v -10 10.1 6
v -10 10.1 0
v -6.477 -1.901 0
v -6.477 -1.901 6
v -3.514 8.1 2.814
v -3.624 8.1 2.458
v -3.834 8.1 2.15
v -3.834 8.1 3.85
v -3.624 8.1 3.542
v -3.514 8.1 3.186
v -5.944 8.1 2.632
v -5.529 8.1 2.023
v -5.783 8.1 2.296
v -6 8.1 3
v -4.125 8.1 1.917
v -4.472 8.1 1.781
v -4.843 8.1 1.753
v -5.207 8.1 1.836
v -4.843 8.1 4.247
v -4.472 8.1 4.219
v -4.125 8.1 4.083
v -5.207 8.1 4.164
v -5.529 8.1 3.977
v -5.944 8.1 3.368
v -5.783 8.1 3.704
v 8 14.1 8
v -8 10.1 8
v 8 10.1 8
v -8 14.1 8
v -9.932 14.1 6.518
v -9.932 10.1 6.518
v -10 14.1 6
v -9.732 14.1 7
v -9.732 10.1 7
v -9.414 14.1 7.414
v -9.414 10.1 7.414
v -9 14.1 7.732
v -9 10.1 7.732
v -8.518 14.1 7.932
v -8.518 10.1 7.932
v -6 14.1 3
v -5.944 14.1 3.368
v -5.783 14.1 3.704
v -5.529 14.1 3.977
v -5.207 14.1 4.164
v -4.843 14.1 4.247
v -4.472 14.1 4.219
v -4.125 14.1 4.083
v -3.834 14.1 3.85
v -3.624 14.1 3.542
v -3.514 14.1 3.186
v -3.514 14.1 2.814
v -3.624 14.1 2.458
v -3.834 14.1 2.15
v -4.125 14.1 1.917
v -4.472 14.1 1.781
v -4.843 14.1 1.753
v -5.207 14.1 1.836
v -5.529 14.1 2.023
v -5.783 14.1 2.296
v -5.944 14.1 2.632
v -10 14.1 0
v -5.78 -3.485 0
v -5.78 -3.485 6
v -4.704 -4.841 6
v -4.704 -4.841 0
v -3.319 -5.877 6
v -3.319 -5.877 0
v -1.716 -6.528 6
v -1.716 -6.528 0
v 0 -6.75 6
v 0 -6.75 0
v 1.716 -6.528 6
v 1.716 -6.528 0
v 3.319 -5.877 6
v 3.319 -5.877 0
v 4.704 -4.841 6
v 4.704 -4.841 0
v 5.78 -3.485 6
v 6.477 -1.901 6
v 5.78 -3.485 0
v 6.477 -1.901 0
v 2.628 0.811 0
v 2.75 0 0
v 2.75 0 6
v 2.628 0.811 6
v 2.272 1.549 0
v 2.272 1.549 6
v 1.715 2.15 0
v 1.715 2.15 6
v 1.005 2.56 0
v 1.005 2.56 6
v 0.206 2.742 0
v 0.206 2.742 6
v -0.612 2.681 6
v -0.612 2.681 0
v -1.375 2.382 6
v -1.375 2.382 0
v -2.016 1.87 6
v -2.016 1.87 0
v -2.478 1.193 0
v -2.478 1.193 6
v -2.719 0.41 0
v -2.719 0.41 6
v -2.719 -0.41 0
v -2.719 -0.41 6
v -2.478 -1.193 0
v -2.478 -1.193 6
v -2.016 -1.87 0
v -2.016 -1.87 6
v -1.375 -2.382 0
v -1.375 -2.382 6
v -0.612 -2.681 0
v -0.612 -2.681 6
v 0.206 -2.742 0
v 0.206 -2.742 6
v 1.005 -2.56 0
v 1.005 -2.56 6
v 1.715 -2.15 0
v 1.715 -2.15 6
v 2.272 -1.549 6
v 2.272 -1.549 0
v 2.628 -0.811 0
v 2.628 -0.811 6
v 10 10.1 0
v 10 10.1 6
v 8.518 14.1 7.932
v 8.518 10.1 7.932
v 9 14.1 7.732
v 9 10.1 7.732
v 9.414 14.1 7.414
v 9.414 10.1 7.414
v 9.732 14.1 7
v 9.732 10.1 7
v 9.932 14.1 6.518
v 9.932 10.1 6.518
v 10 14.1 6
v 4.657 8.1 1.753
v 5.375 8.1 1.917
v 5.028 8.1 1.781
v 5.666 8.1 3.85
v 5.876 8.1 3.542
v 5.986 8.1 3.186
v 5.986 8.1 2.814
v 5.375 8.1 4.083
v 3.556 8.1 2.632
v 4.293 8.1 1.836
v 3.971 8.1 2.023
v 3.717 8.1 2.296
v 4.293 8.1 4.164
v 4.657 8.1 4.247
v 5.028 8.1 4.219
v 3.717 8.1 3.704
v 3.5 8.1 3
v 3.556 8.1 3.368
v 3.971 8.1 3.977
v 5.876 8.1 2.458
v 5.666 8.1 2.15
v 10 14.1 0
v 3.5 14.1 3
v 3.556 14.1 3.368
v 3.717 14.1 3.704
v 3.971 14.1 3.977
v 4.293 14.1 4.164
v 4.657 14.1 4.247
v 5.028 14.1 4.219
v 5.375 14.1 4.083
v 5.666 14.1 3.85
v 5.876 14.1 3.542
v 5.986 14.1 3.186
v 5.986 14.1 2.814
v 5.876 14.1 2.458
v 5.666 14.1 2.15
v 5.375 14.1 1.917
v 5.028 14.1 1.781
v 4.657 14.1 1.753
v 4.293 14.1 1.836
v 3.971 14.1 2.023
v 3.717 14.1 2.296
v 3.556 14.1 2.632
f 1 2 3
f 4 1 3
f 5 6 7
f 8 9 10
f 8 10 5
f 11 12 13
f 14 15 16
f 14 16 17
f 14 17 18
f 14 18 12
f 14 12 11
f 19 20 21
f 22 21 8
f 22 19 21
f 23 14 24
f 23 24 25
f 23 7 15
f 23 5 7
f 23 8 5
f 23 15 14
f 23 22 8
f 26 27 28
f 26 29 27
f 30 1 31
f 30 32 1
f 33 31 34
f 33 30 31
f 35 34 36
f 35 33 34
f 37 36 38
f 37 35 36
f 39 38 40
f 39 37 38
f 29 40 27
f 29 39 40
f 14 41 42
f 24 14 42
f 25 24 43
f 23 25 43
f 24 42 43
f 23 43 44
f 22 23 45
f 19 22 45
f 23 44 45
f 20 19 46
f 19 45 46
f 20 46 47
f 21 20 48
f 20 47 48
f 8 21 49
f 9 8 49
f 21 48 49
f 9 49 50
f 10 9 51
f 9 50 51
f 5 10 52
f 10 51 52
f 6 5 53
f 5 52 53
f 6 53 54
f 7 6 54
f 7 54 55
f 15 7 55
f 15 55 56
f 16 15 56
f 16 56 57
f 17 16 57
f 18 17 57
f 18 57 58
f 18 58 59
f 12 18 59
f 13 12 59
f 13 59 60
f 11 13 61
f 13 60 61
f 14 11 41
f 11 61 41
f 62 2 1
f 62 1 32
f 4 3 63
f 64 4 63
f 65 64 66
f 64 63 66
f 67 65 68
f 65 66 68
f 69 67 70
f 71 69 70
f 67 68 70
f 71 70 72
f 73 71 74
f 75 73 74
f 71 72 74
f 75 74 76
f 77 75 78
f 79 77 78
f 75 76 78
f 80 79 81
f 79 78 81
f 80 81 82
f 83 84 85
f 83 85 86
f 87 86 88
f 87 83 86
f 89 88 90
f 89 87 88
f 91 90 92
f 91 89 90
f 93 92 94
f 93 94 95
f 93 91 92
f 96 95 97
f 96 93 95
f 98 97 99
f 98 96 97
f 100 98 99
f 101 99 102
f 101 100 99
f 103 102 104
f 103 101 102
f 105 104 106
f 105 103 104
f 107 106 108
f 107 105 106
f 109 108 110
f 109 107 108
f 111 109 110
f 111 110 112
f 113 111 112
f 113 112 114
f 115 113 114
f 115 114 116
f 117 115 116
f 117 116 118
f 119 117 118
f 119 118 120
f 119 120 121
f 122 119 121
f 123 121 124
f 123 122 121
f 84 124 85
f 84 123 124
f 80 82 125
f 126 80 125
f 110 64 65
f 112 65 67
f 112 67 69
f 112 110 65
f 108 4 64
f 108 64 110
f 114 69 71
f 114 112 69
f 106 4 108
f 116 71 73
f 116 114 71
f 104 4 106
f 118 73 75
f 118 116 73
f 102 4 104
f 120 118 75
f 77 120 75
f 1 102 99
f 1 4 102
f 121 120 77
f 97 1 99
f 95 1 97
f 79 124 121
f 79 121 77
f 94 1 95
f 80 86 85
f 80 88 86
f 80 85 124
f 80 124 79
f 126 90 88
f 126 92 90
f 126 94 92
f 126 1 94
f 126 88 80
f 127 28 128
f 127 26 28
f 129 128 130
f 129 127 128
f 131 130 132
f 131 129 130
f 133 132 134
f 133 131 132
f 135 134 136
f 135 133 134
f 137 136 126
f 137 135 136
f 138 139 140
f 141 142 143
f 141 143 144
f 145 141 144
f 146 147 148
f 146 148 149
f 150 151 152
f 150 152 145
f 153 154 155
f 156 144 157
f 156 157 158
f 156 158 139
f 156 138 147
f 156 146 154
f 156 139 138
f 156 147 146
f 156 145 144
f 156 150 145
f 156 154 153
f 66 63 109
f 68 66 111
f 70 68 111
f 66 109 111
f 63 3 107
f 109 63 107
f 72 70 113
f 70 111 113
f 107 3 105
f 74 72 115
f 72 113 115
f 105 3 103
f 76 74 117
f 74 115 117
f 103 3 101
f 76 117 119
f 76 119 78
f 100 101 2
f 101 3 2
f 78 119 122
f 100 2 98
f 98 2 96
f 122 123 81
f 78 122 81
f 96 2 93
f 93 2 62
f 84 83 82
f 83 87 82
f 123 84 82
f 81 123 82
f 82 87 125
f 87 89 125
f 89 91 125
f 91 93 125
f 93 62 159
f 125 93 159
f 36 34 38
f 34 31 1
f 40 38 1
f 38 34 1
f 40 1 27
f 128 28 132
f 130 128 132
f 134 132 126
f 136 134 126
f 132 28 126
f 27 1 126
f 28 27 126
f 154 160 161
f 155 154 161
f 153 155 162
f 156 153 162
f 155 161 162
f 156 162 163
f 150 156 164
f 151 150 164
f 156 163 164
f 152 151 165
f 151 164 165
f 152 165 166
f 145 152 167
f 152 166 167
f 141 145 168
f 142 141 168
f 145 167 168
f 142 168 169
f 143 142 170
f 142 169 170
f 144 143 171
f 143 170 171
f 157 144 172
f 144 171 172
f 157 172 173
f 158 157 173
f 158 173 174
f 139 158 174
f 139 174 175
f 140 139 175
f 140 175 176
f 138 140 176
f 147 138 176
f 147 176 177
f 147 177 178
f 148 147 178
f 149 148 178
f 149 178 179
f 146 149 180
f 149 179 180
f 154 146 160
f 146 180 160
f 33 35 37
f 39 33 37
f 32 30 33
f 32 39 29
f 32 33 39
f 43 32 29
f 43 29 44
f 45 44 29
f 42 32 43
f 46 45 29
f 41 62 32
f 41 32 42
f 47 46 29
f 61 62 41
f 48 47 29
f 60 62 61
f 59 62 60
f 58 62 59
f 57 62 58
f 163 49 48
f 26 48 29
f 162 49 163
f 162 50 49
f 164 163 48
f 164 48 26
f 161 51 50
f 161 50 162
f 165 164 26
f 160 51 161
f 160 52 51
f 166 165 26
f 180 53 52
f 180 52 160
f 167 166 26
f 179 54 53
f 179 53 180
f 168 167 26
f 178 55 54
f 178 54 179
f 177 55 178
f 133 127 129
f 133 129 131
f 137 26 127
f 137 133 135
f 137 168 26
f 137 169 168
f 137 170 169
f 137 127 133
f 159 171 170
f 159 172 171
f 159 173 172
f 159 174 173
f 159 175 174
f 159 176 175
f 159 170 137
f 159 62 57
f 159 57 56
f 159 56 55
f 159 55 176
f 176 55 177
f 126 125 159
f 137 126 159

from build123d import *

# Parameters (mm, degrees)
F0_R     = 2.75
F1_DEPTH = 6
F0_W     = 20
F0_H     = 4
F2_DEPTH = 8
F3_R     = 1.25
F4_DEPTH = 6
F5_R     = 2


with BuildPart() as f1:
    # F0 (on Top) → F1 (new body)
    with BuildSketch(Plane.XY):
        with BuildLine():
            Line((-10, 10.1), (-6.476664, -1.9014))
            ThreePointArc((-6.476664, -1.9014), (0, -6.75), (6.476664, -1.9014))
            Line((6.476664, -1.9014), (10, 10.1))
            Line((10, 10.1), (-10, 10.1))
        make_face()
        Circle(F0_R, mode=Mode.SUBTRACT)
    extrude(amount=F1_DEPTH)

    # F0 (on Top) → F2 (join)
    with BuildSketch(Plane.XY):
        with Locations((0, 12.1)):
            Rectangle(F0_W, F0_H)
    extrude(amount=F2_DEPTH)

    # F3 (on face) → F4 (cut)
    with BuildSketch(Plane(origin=(0, 14.1, 0), x_dir=(-1, 0, 0), z_dir=(0, 1, 0))):
        with Locations((-4.75, 3)):
            Circle(F3_R)
        with Locations((4.75, 3)):
            Circle(F3_R)
    extrude(amount=-F4_DEPTH, mode=Mode.SUBTRACT)

    # F5
    f5_edges = [f1.edges().sort_by_distance(p)[0] for p in [
        (-10, 12.1, 8),
        (10, 12.1, 8),
    ]]
    fillet(f5_edges, radius=F5_R)


solid = f1.part
